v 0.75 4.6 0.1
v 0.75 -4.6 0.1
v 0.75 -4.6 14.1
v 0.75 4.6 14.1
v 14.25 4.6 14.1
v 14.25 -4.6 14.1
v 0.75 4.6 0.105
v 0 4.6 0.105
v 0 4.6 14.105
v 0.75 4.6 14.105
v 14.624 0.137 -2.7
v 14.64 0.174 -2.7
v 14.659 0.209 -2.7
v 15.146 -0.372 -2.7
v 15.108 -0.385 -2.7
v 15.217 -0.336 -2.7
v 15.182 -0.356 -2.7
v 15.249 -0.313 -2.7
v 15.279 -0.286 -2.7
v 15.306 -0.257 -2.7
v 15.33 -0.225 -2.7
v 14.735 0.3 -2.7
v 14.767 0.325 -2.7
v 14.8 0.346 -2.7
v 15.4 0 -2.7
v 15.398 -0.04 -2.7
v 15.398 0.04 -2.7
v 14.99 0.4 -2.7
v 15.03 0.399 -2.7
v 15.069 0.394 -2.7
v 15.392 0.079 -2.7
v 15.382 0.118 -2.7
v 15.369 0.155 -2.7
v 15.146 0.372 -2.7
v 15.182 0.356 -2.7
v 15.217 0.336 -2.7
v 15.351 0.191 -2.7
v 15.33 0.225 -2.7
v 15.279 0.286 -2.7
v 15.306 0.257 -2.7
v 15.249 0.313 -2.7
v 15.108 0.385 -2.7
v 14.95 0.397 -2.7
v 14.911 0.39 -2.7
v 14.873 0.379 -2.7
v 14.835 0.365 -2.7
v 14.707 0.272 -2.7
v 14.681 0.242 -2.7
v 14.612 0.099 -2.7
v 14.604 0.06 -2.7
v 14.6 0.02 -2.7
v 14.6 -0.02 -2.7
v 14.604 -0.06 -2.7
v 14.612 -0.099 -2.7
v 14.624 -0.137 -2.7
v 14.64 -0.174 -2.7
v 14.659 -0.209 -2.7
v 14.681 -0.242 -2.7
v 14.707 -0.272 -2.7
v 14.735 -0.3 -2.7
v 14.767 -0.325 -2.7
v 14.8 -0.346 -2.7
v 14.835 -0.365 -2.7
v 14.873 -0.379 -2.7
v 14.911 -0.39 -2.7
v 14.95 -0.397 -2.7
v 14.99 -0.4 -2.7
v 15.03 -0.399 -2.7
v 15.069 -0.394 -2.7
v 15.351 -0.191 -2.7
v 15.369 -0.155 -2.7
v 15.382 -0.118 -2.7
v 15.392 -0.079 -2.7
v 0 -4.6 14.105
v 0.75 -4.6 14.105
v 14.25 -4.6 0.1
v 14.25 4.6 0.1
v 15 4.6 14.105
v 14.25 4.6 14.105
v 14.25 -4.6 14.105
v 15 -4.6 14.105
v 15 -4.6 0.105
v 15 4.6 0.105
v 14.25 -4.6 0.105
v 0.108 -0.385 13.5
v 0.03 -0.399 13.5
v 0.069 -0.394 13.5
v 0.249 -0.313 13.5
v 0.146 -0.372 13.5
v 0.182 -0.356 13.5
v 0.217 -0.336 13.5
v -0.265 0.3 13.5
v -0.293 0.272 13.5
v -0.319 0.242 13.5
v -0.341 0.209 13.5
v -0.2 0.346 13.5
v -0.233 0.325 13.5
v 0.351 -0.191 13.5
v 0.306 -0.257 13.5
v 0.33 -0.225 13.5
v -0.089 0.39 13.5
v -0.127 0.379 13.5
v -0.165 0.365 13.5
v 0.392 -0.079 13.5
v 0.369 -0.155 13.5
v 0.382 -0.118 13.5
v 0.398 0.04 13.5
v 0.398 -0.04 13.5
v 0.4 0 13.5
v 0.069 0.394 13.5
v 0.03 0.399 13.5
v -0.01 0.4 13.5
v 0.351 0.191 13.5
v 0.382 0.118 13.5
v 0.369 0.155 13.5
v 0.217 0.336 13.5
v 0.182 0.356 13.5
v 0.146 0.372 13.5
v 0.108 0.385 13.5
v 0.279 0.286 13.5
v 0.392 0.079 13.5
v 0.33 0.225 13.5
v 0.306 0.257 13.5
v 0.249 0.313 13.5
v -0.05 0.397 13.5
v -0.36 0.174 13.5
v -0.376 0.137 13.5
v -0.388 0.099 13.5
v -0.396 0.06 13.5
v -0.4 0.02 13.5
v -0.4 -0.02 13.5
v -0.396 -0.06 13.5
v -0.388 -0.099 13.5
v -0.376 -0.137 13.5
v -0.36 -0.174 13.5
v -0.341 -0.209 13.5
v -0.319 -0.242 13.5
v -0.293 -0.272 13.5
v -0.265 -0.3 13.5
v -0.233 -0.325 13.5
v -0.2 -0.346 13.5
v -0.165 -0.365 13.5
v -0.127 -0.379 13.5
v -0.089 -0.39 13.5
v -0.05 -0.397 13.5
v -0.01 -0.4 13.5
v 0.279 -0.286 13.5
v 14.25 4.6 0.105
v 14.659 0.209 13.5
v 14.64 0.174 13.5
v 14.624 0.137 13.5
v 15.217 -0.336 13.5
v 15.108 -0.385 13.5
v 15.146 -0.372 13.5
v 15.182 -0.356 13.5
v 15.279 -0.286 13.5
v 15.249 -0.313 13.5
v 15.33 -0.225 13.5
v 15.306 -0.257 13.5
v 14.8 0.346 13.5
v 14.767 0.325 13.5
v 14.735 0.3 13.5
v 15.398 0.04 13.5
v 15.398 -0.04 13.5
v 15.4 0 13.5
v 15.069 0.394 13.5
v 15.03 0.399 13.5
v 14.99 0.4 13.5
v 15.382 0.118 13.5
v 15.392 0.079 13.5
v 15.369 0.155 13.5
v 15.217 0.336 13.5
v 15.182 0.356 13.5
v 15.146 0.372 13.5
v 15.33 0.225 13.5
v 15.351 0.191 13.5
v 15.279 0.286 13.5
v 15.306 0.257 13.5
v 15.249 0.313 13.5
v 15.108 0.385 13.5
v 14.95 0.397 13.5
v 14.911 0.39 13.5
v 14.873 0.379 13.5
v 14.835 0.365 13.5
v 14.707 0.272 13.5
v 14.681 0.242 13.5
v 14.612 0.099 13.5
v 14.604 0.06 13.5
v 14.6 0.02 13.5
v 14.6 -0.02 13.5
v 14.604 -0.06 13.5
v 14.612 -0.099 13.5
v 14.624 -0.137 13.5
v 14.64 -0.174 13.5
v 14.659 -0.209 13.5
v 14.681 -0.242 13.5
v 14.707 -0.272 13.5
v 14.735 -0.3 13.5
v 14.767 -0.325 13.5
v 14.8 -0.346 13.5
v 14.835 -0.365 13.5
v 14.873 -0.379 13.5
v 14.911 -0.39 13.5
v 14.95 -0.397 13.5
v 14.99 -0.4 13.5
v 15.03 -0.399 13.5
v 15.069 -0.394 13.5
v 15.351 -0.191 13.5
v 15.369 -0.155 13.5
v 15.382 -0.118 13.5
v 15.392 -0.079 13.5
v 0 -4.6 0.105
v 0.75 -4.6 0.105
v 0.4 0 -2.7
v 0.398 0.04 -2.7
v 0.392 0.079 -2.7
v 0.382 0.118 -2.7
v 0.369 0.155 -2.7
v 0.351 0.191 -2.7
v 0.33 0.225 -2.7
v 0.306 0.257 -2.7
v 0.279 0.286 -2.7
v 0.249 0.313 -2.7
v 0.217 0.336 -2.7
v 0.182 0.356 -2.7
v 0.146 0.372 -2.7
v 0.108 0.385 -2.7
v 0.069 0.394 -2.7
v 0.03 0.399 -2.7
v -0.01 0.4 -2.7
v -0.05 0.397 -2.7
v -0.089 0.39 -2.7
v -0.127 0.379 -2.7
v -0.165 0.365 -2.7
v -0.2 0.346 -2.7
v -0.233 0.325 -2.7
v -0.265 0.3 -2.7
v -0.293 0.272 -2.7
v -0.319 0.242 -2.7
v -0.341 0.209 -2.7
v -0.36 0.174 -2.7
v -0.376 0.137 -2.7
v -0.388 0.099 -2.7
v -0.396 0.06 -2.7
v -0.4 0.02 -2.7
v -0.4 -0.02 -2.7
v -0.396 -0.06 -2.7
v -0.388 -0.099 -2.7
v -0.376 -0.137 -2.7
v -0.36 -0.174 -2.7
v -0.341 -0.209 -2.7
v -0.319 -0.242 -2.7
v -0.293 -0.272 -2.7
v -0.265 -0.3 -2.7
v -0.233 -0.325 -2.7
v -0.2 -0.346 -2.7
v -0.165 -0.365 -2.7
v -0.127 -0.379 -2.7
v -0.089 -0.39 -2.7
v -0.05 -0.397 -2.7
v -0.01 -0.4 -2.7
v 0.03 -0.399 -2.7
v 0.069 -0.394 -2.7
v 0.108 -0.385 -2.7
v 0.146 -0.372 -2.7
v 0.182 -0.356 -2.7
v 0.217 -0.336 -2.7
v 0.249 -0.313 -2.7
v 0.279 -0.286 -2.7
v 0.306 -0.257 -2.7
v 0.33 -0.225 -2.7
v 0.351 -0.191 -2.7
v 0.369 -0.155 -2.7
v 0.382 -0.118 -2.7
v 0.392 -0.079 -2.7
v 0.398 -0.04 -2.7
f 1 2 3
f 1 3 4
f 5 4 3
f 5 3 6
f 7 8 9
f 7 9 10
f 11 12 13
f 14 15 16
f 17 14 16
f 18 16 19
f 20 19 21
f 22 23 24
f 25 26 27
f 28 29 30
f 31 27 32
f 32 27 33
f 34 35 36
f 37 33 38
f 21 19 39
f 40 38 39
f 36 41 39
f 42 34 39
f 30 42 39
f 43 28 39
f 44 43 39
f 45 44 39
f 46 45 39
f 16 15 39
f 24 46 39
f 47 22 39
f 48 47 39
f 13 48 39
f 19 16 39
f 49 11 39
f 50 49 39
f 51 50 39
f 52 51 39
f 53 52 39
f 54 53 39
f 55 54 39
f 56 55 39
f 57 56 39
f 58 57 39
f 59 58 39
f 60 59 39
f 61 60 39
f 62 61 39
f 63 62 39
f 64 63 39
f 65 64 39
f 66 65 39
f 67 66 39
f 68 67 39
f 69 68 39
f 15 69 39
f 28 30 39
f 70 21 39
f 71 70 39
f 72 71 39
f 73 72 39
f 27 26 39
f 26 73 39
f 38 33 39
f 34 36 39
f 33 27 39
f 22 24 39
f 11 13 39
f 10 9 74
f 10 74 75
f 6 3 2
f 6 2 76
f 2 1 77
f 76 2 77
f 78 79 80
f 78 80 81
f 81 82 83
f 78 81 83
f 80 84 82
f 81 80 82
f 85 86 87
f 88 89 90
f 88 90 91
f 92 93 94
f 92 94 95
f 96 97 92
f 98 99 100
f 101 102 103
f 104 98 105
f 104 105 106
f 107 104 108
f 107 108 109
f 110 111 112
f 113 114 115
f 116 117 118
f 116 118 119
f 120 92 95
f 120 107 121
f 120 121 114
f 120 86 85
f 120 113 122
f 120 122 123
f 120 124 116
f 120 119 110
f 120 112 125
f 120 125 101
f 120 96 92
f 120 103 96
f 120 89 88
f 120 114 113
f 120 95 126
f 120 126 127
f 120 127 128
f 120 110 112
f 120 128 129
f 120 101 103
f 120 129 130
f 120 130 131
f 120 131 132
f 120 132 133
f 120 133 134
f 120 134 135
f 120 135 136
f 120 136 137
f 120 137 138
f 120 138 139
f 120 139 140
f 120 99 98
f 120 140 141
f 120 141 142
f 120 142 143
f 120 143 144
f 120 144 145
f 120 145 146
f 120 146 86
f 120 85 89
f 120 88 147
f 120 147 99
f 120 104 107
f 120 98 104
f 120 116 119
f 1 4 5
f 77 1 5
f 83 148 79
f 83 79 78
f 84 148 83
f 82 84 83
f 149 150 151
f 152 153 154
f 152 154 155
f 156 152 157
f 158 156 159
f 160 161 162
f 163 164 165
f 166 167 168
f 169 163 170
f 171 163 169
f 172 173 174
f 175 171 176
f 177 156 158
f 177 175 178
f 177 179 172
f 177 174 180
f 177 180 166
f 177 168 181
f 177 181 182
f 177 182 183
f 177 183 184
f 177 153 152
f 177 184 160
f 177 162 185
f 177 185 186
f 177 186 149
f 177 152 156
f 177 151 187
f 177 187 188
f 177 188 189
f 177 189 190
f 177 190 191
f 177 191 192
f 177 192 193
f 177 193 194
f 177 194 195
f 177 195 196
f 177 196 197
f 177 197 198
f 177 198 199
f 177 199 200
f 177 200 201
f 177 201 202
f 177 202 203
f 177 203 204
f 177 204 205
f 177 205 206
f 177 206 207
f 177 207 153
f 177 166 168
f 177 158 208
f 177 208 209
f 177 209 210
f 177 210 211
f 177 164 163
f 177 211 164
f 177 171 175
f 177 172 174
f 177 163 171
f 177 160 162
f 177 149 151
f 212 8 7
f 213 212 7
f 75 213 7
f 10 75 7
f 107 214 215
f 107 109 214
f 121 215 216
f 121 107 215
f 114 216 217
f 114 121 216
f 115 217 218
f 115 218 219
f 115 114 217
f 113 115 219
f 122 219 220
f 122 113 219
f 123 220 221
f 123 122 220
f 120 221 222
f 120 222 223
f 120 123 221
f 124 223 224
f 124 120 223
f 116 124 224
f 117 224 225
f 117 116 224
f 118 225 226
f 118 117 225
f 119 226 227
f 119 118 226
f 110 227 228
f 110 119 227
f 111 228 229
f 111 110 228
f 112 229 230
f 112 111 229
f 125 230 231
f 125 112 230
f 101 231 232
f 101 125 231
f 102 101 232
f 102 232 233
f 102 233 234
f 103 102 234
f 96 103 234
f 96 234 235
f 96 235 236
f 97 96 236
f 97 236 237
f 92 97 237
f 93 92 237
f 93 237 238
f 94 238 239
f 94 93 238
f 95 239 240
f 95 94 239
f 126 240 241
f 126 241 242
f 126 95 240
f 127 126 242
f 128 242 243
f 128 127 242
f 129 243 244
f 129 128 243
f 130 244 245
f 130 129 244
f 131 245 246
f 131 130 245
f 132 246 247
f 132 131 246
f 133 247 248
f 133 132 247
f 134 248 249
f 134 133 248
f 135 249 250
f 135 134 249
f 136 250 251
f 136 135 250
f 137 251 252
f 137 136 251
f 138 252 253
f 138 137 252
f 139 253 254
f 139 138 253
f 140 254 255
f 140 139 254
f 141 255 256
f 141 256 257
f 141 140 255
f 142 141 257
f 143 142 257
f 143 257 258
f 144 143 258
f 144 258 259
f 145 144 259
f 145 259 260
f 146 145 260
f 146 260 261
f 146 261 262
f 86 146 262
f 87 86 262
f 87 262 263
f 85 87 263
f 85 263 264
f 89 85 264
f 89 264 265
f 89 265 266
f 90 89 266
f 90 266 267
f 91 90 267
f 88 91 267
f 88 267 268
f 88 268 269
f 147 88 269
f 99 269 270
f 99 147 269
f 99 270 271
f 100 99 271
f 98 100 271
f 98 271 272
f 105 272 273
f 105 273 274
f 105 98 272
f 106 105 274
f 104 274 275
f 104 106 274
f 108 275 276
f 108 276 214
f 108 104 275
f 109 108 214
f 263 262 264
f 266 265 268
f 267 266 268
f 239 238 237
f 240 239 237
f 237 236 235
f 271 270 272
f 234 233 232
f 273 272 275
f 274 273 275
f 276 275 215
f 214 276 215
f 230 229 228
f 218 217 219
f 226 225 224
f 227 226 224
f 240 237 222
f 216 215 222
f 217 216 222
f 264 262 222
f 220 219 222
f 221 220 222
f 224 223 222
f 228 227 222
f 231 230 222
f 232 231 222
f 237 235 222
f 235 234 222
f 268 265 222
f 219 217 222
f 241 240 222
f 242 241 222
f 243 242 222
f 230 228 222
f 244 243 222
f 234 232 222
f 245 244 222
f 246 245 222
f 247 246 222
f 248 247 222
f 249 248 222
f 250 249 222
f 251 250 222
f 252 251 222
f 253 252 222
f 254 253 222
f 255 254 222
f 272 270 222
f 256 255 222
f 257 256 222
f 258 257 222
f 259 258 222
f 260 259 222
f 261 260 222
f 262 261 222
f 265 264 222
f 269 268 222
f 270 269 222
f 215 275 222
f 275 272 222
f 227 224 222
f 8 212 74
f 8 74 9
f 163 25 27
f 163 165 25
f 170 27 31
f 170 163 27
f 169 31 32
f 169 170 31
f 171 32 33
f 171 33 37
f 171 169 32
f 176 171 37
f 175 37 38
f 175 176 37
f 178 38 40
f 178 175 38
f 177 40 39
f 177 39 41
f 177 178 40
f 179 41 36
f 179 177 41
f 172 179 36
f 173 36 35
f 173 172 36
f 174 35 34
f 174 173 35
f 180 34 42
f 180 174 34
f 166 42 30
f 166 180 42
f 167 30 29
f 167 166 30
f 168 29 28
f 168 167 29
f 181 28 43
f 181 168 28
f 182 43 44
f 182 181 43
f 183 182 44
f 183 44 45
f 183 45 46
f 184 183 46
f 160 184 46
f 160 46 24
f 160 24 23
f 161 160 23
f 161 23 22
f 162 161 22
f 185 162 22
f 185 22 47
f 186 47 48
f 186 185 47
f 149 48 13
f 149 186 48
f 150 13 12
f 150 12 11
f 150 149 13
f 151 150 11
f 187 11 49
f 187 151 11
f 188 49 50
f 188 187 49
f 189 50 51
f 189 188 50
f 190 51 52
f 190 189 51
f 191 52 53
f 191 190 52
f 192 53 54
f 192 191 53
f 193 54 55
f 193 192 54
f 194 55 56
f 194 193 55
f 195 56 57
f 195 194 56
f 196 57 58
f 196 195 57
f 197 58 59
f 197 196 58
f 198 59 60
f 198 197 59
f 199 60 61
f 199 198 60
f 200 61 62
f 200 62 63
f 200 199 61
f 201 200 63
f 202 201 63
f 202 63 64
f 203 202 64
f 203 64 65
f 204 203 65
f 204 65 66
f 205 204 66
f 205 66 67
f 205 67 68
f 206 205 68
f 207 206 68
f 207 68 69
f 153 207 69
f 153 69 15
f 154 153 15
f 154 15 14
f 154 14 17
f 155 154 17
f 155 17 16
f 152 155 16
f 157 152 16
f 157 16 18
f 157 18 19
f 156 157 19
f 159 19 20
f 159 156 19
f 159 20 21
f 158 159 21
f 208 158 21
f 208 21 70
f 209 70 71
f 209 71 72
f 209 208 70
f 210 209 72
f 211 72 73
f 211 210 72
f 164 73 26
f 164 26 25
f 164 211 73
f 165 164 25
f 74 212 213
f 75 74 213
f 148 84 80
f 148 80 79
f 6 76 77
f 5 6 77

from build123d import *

# Parameters (mm, degrees)
SKETCH_W          = 13.5
SKETCH_H          = 9.2
PAD_DEPTH         = 14
SKETCH001_R       = 0.4
PAD001_DEPTH      = 13
PAD001_DEPTH_BACK = 3.2
SKETCH002_W       = 0.75
SKETCH002_H       = 9.2
PAD002_DEPTH      = 14


with BuildPart() as pad:
    # Sketch → Pad (new body)
    with BuildSketch(Plane.XY.offset(0.1)):
        with Locations((7.5, 0)):
            Rectangle(SKETCH_W, SKETCH_H)
    extrude(amount=PAD_DEPTH)


with BuildPart() as pad001:
    # Sketch001 → Pad001 (new body, two sides)
    with BuildSketch(Plane.XY.offset(0.5)) as pad001_sk:
        Circle(SKETCH001_R)
        with Locations((15, 0)):
            Circle(SKETCH001_R)
    extrude(amount=PAD001_DEPTH)
    extrude(pad001_sk.sketch, amount=-PAD001_DEPTH_BACK)


with BuildPart() as pad002:
    # Sketch002 → Pad002 (new body)
    with BuildSketch(Plane.XY.offset(0.105)):
        with Locations((0.375, 0)):
            Rectangle(SKETCH002_W, SKETCH002_H)
        with Locations((14.625, 0)):
            Rectangle(SKETCH002_W, SKETCH002_H)
    extrude(amount=PAD002_DEPTH)


solid = Compound([pad.part, pad001.part, pad002.part])
